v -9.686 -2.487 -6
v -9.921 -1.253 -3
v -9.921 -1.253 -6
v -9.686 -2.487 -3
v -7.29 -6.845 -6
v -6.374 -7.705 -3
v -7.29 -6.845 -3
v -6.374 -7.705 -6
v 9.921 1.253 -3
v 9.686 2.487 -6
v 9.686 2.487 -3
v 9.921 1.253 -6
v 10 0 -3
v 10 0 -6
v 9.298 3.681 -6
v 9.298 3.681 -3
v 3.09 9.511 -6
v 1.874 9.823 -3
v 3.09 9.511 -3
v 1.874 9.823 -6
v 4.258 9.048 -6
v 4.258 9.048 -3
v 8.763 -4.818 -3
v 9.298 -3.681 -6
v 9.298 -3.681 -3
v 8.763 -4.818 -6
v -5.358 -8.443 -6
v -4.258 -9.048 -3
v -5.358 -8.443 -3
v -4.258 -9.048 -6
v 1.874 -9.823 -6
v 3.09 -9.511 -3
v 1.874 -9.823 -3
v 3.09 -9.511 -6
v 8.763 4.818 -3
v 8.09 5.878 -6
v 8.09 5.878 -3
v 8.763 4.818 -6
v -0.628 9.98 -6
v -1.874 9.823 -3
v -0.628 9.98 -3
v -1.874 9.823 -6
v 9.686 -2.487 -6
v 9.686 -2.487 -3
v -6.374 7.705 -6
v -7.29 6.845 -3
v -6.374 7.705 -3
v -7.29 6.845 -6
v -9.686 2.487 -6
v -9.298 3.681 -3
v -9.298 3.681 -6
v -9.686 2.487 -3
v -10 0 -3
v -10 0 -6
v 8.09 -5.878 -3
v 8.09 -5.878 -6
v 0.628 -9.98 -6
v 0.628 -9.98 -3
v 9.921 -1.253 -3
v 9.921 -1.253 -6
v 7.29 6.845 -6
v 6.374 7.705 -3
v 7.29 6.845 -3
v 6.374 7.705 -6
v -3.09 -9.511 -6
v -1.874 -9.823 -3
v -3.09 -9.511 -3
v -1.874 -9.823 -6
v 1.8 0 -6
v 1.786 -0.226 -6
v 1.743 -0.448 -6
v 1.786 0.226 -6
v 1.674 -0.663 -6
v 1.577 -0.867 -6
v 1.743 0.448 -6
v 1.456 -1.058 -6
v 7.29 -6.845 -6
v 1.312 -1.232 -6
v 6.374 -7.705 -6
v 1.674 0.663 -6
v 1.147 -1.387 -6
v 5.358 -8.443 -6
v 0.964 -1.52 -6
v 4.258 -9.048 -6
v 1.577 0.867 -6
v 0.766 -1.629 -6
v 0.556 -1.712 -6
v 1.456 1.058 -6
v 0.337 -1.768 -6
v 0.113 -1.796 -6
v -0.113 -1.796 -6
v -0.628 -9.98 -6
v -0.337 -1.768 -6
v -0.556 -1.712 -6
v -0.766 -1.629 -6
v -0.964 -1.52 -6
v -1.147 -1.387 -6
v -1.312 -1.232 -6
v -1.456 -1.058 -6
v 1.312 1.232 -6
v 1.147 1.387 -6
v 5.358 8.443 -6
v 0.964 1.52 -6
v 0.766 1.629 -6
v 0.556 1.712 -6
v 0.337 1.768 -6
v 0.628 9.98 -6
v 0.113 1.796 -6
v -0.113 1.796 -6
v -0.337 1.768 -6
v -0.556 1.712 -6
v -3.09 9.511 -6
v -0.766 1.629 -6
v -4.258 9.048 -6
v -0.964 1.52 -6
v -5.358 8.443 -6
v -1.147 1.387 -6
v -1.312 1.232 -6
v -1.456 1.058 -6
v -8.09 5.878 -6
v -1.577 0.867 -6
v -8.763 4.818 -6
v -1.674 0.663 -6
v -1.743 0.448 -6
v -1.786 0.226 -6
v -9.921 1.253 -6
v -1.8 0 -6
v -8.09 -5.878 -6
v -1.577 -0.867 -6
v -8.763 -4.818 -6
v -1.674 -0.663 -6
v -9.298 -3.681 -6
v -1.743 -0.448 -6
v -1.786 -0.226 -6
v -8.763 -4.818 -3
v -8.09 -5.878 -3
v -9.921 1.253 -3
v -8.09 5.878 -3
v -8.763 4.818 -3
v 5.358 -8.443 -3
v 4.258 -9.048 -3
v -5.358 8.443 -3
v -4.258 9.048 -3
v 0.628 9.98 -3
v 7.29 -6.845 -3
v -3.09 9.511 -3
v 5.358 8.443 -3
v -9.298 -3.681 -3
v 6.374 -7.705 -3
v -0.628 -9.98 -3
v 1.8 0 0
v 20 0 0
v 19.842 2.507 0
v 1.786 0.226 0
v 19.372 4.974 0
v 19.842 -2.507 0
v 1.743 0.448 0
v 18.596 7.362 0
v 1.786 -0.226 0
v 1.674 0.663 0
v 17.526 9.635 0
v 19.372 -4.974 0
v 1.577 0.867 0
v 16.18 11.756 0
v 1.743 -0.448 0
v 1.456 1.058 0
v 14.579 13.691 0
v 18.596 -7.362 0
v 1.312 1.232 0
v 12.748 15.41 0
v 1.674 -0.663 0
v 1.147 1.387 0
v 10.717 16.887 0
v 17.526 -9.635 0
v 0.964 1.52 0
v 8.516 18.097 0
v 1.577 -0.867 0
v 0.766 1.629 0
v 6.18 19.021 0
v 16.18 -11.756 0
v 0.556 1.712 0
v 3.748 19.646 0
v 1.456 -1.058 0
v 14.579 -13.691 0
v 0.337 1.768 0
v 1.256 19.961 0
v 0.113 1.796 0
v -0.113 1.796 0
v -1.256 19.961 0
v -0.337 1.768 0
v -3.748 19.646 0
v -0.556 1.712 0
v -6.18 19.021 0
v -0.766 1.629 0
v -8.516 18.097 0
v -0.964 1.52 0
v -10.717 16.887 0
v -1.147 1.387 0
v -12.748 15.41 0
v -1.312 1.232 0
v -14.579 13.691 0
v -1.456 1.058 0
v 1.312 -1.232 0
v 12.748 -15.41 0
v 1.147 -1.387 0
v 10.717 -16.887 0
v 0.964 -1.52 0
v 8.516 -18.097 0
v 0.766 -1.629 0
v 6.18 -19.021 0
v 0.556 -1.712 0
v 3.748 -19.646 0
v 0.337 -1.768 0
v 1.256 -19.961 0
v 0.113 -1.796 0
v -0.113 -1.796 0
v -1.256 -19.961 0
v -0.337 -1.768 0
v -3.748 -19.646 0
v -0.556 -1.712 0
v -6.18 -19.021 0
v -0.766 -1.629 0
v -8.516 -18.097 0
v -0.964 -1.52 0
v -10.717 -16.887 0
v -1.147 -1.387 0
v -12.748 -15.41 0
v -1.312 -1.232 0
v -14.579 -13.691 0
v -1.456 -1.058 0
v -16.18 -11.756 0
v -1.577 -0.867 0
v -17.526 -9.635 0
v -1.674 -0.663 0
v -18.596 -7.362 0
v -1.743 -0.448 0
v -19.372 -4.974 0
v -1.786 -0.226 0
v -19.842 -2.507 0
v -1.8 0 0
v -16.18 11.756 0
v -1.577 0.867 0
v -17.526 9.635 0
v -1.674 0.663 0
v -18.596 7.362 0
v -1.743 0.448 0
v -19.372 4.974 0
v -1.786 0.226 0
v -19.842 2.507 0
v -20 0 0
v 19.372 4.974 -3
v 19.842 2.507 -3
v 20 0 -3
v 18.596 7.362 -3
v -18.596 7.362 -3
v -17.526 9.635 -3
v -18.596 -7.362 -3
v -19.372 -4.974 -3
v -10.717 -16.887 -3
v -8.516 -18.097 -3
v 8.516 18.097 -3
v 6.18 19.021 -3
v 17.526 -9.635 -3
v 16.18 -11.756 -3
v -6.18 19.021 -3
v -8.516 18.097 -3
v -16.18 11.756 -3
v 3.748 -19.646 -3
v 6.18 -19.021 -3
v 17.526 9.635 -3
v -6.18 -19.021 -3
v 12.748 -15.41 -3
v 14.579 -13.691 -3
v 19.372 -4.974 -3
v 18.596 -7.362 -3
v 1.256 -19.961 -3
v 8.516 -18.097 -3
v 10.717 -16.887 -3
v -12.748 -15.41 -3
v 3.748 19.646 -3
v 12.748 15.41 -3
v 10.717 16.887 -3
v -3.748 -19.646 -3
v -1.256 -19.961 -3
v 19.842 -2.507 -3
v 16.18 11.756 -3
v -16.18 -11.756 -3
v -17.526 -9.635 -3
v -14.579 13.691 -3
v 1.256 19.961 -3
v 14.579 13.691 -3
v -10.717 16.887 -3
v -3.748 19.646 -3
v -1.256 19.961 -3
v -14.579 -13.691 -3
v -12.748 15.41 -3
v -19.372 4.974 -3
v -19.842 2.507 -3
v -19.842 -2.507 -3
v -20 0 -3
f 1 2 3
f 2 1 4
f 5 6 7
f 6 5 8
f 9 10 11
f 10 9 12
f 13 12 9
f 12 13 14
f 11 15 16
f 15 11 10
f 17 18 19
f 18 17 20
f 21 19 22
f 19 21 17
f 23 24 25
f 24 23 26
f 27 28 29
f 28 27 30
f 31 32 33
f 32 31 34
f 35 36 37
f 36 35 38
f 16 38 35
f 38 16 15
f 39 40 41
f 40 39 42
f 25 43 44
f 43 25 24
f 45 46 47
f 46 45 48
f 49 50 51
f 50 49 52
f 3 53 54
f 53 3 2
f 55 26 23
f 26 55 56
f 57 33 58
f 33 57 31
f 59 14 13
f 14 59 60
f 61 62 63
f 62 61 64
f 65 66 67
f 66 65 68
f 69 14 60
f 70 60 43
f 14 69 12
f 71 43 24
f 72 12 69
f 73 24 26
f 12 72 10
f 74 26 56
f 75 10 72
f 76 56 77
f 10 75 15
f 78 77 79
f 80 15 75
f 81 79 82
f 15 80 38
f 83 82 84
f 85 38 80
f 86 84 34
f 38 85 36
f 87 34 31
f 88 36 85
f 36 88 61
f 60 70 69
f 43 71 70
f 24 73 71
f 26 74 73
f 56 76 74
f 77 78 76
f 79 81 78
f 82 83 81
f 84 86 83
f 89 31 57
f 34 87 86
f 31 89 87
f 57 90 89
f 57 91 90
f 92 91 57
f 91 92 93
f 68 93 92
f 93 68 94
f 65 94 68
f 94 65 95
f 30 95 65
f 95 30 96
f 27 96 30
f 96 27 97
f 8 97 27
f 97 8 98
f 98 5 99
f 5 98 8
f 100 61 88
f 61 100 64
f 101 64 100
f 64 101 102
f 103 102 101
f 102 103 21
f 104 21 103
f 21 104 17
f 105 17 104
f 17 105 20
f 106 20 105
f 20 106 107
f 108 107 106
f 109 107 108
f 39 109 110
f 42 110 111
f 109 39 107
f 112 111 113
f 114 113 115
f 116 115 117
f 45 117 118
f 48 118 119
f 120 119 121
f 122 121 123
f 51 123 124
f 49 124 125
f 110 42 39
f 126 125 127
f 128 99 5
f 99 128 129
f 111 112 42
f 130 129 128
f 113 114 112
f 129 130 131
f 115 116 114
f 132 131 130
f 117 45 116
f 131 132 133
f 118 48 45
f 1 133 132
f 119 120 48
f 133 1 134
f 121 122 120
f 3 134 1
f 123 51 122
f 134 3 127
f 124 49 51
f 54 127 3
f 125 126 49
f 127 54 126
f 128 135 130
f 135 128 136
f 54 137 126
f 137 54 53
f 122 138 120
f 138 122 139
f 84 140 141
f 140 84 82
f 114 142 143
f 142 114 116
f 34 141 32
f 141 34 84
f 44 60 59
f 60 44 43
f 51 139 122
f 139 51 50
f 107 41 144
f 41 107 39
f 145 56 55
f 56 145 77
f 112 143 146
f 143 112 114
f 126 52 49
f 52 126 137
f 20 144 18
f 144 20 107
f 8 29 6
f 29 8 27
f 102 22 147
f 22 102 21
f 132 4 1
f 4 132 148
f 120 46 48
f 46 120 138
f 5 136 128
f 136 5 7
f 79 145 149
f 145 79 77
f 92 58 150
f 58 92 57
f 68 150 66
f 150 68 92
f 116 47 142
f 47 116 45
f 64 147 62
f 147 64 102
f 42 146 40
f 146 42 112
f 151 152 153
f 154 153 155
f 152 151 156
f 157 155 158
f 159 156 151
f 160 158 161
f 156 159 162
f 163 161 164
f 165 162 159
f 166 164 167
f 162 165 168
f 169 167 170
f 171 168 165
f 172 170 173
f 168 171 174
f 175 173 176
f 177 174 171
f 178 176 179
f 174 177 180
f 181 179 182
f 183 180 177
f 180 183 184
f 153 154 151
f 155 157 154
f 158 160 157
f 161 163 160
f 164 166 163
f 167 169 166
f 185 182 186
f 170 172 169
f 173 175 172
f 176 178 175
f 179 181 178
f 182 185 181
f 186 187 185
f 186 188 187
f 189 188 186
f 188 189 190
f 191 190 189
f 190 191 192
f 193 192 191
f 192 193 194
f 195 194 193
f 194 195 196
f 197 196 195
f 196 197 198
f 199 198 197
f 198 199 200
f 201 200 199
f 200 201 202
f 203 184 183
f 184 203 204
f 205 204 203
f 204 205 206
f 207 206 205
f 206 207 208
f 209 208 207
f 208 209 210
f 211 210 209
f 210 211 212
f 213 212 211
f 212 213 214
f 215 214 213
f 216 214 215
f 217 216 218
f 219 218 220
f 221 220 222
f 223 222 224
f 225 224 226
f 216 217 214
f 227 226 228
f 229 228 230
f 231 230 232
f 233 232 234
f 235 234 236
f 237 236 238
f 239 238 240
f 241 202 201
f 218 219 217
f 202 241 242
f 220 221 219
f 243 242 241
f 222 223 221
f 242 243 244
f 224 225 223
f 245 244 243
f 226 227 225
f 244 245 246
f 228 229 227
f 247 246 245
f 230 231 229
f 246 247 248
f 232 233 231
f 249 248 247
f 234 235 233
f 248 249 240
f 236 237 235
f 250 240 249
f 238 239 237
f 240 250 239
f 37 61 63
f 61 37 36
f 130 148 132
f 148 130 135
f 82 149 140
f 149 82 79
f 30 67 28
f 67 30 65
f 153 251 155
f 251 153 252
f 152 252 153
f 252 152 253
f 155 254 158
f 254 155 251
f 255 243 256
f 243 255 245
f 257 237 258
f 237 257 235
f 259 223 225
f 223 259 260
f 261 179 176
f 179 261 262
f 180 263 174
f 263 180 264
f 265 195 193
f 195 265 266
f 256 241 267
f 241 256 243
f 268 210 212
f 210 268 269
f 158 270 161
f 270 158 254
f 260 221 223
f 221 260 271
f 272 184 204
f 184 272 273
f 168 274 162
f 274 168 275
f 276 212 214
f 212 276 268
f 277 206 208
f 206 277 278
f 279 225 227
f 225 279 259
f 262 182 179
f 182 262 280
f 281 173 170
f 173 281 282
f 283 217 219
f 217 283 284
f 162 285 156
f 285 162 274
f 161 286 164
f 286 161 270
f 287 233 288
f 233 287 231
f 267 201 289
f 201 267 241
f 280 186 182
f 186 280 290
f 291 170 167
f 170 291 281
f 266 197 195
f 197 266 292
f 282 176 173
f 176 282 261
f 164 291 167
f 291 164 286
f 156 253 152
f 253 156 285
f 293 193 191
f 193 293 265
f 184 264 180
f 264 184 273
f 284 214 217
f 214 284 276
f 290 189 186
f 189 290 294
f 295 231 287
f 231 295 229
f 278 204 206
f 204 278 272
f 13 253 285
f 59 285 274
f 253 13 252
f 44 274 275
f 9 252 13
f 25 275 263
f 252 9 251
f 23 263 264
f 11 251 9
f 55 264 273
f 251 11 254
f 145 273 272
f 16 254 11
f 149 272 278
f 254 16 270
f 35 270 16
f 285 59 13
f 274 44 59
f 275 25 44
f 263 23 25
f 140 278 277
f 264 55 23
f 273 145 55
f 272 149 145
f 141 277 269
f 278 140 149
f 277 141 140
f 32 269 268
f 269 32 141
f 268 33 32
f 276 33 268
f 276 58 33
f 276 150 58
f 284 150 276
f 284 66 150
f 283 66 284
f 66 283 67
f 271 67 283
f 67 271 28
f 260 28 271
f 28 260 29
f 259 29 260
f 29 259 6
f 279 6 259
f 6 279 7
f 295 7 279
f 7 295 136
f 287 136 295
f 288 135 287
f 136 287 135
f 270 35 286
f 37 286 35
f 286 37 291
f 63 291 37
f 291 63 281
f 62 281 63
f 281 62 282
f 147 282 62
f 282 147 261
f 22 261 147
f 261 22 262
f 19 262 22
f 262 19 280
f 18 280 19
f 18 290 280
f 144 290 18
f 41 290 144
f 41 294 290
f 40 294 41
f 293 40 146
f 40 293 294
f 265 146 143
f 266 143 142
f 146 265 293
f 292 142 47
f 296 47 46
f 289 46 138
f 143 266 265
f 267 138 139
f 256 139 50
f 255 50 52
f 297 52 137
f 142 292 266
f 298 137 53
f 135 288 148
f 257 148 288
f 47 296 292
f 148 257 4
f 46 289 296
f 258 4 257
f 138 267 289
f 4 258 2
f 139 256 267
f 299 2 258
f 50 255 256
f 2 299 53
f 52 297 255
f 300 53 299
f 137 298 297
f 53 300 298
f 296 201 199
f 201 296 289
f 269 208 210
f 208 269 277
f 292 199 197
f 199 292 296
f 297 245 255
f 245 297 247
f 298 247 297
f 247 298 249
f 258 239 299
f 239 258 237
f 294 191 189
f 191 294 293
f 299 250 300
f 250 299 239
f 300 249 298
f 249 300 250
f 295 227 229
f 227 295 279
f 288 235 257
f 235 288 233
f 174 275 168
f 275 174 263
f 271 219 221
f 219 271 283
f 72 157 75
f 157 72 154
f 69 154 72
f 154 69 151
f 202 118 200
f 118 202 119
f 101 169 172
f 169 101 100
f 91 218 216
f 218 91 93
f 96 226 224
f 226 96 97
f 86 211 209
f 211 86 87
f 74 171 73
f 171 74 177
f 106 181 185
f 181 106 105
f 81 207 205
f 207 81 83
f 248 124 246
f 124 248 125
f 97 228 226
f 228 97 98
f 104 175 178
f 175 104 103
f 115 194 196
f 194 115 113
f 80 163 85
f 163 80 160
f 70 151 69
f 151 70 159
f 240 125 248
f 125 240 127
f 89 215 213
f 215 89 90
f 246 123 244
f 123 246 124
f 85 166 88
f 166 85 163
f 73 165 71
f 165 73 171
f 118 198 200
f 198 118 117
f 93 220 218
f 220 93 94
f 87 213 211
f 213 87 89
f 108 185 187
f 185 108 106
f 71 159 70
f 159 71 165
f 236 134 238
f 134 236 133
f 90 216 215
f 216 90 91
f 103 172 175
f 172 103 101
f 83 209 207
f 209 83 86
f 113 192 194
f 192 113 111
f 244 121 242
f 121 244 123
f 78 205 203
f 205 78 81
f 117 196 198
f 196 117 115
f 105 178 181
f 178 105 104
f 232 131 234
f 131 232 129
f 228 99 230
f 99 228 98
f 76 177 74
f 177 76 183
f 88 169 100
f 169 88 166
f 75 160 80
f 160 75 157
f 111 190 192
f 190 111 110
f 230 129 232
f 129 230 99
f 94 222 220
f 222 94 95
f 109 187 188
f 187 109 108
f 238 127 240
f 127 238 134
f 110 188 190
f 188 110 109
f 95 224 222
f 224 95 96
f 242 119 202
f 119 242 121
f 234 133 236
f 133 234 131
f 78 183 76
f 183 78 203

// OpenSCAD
$fn = 50;


difference() {
	union() {
		translate(v = [0, 0, -6.0000000000]) {
			cylinder(h = 6, r = 10.0000000000);
		}
		translate(v = [0, 0, -3.0000000000]) {
			cylinder(h = 3, r = 20.0000000000);
		}
	}
	union() {
		#translate(v = [0, 0, -6]) {
			cylinder(h = 6, r = 1.8000000000);
		}
	}
}
